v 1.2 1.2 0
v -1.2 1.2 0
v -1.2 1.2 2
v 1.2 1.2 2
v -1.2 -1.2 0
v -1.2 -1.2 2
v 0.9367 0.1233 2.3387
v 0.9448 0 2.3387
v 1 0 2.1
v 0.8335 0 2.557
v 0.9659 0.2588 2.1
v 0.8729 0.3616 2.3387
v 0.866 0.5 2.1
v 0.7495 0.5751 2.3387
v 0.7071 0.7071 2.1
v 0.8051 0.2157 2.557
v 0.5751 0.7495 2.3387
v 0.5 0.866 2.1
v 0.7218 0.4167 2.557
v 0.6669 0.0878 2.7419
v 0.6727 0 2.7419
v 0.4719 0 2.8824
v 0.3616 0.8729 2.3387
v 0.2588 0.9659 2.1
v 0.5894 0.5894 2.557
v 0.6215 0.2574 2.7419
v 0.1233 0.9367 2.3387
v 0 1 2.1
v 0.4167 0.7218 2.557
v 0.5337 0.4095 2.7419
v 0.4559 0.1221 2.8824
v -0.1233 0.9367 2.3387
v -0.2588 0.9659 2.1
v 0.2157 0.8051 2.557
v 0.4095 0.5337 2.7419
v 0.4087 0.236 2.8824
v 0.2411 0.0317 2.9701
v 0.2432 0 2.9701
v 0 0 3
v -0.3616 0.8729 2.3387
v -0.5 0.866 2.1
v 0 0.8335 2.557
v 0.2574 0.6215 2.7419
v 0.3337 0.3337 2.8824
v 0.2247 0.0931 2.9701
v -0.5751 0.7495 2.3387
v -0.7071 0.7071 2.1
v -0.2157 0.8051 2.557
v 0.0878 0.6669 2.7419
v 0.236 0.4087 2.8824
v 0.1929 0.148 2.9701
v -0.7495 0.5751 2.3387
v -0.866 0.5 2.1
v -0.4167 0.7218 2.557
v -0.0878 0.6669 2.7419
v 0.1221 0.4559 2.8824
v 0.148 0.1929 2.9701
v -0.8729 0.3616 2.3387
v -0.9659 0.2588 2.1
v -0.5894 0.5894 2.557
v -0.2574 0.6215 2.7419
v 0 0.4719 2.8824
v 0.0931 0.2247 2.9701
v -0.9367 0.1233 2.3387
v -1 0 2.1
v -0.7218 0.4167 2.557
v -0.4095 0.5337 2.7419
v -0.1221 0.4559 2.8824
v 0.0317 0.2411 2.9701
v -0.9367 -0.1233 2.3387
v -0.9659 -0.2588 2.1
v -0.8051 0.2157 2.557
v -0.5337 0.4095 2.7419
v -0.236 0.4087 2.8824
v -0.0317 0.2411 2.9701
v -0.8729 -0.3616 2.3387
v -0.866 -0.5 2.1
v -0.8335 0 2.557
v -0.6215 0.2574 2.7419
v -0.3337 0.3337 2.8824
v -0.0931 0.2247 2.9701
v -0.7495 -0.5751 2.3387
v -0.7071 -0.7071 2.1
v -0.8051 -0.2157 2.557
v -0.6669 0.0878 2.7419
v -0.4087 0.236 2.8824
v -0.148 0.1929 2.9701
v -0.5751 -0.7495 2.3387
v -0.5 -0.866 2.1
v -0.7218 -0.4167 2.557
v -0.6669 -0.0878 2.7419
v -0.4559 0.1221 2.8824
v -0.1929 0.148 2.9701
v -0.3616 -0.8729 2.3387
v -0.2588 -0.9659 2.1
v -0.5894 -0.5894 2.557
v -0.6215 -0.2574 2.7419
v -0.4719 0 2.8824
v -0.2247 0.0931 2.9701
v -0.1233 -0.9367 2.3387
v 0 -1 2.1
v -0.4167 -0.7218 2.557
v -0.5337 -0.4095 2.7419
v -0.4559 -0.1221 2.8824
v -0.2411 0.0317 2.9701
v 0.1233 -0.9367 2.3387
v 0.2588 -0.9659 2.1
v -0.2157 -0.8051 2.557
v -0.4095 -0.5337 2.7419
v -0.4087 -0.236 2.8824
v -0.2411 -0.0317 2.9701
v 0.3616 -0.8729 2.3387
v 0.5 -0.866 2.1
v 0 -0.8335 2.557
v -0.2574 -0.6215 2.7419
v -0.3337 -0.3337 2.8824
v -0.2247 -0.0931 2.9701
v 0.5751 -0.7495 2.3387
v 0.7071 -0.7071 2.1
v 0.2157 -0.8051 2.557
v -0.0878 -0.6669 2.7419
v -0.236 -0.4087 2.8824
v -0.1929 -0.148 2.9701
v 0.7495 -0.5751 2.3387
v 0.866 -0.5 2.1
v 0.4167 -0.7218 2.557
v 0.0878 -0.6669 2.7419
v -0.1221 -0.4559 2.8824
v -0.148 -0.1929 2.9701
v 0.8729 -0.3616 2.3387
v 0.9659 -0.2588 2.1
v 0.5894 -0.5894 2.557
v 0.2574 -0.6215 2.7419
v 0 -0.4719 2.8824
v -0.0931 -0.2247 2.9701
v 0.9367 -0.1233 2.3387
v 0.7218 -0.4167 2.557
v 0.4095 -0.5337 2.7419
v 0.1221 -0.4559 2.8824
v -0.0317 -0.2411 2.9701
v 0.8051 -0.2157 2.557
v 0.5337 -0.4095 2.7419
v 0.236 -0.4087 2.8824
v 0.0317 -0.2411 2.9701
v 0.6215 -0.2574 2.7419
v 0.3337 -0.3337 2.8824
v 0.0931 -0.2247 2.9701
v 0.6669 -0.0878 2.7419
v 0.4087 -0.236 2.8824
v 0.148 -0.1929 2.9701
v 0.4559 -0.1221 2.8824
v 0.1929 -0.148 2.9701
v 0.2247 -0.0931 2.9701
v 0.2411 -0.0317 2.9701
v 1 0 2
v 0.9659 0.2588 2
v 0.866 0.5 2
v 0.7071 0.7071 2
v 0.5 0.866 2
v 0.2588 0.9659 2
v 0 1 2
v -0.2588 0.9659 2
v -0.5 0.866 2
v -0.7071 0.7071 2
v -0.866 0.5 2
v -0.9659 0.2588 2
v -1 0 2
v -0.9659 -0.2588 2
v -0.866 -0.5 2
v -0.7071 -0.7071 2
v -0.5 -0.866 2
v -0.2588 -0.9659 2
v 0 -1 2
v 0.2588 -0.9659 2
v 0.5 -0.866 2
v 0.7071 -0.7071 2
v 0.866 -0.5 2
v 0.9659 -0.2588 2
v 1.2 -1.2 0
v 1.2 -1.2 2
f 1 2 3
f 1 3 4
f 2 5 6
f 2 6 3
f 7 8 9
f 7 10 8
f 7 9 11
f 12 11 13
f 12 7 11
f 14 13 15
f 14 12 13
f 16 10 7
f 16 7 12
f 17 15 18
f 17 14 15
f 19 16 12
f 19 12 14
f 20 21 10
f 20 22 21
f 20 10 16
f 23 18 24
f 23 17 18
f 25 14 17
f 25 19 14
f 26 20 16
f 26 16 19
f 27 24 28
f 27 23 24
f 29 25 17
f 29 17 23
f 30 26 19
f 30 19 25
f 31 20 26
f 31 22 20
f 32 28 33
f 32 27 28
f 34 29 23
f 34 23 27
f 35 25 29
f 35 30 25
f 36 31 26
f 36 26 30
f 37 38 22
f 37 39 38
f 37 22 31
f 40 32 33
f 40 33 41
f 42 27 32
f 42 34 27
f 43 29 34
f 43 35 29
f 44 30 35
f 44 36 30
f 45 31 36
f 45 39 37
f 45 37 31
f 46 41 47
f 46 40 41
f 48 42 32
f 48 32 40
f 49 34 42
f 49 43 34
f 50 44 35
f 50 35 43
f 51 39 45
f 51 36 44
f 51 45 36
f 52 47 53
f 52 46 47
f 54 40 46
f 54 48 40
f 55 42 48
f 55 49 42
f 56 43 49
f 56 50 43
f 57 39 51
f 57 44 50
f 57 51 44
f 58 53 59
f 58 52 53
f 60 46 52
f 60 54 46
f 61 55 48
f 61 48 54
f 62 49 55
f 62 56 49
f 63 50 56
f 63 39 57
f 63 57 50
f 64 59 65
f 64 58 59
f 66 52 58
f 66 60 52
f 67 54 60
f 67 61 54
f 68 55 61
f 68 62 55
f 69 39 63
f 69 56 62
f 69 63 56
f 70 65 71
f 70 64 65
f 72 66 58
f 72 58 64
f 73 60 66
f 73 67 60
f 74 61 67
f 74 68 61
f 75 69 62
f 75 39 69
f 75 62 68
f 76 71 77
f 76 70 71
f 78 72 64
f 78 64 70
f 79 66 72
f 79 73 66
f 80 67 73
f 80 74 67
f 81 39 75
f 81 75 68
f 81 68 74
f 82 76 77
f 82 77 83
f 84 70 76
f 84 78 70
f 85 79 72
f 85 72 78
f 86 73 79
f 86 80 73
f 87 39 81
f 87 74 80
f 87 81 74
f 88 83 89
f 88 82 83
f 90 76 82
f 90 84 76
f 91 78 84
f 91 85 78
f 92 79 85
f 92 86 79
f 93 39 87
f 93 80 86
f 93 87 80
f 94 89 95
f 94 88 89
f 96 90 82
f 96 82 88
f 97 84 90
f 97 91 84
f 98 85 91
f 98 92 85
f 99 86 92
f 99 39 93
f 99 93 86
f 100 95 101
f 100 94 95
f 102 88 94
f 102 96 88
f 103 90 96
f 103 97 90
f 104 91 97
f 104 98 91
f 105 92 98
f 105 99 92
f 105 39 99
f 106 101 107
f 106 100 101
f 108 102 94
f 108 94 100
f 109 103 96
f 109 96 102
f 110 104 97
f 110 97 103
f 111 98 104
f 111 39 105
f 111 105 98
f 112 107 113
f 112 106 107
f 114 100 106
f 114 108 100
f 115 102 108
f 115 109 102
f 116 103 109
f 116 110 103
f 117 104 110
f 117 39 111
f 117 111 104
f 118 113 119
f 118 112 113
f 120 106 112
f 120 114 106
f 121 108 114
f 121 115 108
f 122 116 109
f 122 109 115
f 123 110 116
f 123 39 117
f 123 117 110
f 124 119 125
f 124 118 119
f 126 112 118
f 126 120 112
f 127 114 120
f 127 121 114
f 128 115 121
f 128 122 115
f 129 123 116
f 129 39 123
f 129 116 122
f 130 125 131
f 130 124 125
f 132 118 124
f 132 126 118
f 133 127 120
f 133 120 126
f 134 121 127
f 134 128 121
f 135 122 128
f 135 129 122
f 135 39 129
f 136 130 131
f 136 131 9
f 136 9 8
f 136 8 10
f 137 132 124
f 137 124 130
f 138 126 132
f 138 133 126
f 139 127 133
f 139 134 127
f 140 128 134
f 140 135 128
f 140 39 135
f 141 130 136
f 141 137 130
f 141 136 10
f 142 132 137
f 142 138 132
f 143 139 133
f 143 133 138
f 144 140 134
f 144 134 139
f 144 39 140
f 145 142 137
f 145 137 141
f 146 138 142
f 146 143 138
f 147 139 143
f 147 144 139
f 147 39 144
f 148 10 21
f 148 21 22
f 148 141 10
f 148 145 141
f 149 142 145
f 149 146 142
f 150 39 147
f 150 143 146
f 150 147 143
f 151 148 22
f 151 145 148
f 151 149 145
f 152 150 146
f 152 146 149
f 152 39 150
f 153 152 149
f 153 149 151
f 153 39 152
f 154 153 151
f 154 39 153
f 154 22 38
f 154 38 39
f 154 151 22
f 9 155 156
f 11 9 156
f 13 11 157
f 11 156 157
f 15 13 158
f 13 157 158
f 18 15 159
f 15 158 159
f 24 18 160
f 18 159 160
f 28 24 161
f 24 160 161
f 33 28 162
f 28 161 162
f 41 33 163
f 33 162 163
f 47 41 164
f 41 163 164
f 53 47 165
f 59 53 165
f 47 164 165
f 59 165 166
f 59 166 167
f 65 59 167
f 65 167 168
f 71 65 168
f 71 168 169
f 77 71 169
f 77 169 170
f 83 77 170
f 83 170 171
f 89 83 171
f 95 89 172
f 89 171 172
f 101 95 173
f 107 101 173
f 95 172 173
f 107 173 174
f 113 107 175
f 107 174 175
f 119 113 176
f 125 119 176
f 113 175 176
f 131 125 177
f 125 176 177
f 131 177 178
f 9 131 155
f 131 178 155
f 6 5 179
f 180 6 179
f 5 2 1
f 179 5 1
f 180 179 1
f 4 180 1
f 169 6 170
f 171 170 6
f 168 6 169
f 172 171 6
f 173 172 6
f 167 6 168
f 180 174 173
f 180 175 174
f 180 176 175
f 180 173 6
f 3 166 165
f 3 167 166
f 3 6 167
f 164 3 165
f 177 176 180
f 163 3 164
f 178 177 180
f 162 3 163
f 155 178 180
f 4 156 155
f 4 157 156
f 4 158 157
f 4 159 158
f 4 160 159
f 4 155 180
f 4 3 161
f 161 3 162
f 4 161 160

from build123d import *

# Parameters (mm, degrees)
SZKIC1_W                    = 2.4
SZKIC1_H                    = 2.4
DODANIE_WYCI_GNI_CIE1_DEPTH = 2
SZKIC2_R                    = 1
DODANIE_WYCI_GNI_CIE2_DEPTH = 0.1


# Read off the part's stored shape, not the designer's step: Kopuła2
with BuildPart() as part:
    # Szkic1 → Dodanie-wyciągnięcie1 (new body)
    with BuildSketch(Plane.XY):
        Rectangle(SZKIC1_W, SZKIC1_H)
    extrude(amount=DODANIE_WYCI_GNI_CIE1_DEPTH)

    # Szkic2 → Dodanie-wyciągnięcie2 (add)
    with BuildSketch(Plane.XY.offset(2)):
        Circle(SZKIC2_R)
    extrude(amount=DODANIE_WYCI_GNI_CIE2_DEPTH)

    # Kopuła2 outline → Kopuła2 (revolve)
    with BuildSketch(Plane.XZ):
        with BuildLine():
            Line((0, 2.1), (1, 2.099999999))
            ThreePointArc((1, 2.099999999), (0.672681203, 2.741868002), (0, 3))
            Line((0, 3), (0, 2.1))
        make_face()
    revolve(axis=Axis((0, 0, 0), (0, 0, 1)))


solid = part.part
